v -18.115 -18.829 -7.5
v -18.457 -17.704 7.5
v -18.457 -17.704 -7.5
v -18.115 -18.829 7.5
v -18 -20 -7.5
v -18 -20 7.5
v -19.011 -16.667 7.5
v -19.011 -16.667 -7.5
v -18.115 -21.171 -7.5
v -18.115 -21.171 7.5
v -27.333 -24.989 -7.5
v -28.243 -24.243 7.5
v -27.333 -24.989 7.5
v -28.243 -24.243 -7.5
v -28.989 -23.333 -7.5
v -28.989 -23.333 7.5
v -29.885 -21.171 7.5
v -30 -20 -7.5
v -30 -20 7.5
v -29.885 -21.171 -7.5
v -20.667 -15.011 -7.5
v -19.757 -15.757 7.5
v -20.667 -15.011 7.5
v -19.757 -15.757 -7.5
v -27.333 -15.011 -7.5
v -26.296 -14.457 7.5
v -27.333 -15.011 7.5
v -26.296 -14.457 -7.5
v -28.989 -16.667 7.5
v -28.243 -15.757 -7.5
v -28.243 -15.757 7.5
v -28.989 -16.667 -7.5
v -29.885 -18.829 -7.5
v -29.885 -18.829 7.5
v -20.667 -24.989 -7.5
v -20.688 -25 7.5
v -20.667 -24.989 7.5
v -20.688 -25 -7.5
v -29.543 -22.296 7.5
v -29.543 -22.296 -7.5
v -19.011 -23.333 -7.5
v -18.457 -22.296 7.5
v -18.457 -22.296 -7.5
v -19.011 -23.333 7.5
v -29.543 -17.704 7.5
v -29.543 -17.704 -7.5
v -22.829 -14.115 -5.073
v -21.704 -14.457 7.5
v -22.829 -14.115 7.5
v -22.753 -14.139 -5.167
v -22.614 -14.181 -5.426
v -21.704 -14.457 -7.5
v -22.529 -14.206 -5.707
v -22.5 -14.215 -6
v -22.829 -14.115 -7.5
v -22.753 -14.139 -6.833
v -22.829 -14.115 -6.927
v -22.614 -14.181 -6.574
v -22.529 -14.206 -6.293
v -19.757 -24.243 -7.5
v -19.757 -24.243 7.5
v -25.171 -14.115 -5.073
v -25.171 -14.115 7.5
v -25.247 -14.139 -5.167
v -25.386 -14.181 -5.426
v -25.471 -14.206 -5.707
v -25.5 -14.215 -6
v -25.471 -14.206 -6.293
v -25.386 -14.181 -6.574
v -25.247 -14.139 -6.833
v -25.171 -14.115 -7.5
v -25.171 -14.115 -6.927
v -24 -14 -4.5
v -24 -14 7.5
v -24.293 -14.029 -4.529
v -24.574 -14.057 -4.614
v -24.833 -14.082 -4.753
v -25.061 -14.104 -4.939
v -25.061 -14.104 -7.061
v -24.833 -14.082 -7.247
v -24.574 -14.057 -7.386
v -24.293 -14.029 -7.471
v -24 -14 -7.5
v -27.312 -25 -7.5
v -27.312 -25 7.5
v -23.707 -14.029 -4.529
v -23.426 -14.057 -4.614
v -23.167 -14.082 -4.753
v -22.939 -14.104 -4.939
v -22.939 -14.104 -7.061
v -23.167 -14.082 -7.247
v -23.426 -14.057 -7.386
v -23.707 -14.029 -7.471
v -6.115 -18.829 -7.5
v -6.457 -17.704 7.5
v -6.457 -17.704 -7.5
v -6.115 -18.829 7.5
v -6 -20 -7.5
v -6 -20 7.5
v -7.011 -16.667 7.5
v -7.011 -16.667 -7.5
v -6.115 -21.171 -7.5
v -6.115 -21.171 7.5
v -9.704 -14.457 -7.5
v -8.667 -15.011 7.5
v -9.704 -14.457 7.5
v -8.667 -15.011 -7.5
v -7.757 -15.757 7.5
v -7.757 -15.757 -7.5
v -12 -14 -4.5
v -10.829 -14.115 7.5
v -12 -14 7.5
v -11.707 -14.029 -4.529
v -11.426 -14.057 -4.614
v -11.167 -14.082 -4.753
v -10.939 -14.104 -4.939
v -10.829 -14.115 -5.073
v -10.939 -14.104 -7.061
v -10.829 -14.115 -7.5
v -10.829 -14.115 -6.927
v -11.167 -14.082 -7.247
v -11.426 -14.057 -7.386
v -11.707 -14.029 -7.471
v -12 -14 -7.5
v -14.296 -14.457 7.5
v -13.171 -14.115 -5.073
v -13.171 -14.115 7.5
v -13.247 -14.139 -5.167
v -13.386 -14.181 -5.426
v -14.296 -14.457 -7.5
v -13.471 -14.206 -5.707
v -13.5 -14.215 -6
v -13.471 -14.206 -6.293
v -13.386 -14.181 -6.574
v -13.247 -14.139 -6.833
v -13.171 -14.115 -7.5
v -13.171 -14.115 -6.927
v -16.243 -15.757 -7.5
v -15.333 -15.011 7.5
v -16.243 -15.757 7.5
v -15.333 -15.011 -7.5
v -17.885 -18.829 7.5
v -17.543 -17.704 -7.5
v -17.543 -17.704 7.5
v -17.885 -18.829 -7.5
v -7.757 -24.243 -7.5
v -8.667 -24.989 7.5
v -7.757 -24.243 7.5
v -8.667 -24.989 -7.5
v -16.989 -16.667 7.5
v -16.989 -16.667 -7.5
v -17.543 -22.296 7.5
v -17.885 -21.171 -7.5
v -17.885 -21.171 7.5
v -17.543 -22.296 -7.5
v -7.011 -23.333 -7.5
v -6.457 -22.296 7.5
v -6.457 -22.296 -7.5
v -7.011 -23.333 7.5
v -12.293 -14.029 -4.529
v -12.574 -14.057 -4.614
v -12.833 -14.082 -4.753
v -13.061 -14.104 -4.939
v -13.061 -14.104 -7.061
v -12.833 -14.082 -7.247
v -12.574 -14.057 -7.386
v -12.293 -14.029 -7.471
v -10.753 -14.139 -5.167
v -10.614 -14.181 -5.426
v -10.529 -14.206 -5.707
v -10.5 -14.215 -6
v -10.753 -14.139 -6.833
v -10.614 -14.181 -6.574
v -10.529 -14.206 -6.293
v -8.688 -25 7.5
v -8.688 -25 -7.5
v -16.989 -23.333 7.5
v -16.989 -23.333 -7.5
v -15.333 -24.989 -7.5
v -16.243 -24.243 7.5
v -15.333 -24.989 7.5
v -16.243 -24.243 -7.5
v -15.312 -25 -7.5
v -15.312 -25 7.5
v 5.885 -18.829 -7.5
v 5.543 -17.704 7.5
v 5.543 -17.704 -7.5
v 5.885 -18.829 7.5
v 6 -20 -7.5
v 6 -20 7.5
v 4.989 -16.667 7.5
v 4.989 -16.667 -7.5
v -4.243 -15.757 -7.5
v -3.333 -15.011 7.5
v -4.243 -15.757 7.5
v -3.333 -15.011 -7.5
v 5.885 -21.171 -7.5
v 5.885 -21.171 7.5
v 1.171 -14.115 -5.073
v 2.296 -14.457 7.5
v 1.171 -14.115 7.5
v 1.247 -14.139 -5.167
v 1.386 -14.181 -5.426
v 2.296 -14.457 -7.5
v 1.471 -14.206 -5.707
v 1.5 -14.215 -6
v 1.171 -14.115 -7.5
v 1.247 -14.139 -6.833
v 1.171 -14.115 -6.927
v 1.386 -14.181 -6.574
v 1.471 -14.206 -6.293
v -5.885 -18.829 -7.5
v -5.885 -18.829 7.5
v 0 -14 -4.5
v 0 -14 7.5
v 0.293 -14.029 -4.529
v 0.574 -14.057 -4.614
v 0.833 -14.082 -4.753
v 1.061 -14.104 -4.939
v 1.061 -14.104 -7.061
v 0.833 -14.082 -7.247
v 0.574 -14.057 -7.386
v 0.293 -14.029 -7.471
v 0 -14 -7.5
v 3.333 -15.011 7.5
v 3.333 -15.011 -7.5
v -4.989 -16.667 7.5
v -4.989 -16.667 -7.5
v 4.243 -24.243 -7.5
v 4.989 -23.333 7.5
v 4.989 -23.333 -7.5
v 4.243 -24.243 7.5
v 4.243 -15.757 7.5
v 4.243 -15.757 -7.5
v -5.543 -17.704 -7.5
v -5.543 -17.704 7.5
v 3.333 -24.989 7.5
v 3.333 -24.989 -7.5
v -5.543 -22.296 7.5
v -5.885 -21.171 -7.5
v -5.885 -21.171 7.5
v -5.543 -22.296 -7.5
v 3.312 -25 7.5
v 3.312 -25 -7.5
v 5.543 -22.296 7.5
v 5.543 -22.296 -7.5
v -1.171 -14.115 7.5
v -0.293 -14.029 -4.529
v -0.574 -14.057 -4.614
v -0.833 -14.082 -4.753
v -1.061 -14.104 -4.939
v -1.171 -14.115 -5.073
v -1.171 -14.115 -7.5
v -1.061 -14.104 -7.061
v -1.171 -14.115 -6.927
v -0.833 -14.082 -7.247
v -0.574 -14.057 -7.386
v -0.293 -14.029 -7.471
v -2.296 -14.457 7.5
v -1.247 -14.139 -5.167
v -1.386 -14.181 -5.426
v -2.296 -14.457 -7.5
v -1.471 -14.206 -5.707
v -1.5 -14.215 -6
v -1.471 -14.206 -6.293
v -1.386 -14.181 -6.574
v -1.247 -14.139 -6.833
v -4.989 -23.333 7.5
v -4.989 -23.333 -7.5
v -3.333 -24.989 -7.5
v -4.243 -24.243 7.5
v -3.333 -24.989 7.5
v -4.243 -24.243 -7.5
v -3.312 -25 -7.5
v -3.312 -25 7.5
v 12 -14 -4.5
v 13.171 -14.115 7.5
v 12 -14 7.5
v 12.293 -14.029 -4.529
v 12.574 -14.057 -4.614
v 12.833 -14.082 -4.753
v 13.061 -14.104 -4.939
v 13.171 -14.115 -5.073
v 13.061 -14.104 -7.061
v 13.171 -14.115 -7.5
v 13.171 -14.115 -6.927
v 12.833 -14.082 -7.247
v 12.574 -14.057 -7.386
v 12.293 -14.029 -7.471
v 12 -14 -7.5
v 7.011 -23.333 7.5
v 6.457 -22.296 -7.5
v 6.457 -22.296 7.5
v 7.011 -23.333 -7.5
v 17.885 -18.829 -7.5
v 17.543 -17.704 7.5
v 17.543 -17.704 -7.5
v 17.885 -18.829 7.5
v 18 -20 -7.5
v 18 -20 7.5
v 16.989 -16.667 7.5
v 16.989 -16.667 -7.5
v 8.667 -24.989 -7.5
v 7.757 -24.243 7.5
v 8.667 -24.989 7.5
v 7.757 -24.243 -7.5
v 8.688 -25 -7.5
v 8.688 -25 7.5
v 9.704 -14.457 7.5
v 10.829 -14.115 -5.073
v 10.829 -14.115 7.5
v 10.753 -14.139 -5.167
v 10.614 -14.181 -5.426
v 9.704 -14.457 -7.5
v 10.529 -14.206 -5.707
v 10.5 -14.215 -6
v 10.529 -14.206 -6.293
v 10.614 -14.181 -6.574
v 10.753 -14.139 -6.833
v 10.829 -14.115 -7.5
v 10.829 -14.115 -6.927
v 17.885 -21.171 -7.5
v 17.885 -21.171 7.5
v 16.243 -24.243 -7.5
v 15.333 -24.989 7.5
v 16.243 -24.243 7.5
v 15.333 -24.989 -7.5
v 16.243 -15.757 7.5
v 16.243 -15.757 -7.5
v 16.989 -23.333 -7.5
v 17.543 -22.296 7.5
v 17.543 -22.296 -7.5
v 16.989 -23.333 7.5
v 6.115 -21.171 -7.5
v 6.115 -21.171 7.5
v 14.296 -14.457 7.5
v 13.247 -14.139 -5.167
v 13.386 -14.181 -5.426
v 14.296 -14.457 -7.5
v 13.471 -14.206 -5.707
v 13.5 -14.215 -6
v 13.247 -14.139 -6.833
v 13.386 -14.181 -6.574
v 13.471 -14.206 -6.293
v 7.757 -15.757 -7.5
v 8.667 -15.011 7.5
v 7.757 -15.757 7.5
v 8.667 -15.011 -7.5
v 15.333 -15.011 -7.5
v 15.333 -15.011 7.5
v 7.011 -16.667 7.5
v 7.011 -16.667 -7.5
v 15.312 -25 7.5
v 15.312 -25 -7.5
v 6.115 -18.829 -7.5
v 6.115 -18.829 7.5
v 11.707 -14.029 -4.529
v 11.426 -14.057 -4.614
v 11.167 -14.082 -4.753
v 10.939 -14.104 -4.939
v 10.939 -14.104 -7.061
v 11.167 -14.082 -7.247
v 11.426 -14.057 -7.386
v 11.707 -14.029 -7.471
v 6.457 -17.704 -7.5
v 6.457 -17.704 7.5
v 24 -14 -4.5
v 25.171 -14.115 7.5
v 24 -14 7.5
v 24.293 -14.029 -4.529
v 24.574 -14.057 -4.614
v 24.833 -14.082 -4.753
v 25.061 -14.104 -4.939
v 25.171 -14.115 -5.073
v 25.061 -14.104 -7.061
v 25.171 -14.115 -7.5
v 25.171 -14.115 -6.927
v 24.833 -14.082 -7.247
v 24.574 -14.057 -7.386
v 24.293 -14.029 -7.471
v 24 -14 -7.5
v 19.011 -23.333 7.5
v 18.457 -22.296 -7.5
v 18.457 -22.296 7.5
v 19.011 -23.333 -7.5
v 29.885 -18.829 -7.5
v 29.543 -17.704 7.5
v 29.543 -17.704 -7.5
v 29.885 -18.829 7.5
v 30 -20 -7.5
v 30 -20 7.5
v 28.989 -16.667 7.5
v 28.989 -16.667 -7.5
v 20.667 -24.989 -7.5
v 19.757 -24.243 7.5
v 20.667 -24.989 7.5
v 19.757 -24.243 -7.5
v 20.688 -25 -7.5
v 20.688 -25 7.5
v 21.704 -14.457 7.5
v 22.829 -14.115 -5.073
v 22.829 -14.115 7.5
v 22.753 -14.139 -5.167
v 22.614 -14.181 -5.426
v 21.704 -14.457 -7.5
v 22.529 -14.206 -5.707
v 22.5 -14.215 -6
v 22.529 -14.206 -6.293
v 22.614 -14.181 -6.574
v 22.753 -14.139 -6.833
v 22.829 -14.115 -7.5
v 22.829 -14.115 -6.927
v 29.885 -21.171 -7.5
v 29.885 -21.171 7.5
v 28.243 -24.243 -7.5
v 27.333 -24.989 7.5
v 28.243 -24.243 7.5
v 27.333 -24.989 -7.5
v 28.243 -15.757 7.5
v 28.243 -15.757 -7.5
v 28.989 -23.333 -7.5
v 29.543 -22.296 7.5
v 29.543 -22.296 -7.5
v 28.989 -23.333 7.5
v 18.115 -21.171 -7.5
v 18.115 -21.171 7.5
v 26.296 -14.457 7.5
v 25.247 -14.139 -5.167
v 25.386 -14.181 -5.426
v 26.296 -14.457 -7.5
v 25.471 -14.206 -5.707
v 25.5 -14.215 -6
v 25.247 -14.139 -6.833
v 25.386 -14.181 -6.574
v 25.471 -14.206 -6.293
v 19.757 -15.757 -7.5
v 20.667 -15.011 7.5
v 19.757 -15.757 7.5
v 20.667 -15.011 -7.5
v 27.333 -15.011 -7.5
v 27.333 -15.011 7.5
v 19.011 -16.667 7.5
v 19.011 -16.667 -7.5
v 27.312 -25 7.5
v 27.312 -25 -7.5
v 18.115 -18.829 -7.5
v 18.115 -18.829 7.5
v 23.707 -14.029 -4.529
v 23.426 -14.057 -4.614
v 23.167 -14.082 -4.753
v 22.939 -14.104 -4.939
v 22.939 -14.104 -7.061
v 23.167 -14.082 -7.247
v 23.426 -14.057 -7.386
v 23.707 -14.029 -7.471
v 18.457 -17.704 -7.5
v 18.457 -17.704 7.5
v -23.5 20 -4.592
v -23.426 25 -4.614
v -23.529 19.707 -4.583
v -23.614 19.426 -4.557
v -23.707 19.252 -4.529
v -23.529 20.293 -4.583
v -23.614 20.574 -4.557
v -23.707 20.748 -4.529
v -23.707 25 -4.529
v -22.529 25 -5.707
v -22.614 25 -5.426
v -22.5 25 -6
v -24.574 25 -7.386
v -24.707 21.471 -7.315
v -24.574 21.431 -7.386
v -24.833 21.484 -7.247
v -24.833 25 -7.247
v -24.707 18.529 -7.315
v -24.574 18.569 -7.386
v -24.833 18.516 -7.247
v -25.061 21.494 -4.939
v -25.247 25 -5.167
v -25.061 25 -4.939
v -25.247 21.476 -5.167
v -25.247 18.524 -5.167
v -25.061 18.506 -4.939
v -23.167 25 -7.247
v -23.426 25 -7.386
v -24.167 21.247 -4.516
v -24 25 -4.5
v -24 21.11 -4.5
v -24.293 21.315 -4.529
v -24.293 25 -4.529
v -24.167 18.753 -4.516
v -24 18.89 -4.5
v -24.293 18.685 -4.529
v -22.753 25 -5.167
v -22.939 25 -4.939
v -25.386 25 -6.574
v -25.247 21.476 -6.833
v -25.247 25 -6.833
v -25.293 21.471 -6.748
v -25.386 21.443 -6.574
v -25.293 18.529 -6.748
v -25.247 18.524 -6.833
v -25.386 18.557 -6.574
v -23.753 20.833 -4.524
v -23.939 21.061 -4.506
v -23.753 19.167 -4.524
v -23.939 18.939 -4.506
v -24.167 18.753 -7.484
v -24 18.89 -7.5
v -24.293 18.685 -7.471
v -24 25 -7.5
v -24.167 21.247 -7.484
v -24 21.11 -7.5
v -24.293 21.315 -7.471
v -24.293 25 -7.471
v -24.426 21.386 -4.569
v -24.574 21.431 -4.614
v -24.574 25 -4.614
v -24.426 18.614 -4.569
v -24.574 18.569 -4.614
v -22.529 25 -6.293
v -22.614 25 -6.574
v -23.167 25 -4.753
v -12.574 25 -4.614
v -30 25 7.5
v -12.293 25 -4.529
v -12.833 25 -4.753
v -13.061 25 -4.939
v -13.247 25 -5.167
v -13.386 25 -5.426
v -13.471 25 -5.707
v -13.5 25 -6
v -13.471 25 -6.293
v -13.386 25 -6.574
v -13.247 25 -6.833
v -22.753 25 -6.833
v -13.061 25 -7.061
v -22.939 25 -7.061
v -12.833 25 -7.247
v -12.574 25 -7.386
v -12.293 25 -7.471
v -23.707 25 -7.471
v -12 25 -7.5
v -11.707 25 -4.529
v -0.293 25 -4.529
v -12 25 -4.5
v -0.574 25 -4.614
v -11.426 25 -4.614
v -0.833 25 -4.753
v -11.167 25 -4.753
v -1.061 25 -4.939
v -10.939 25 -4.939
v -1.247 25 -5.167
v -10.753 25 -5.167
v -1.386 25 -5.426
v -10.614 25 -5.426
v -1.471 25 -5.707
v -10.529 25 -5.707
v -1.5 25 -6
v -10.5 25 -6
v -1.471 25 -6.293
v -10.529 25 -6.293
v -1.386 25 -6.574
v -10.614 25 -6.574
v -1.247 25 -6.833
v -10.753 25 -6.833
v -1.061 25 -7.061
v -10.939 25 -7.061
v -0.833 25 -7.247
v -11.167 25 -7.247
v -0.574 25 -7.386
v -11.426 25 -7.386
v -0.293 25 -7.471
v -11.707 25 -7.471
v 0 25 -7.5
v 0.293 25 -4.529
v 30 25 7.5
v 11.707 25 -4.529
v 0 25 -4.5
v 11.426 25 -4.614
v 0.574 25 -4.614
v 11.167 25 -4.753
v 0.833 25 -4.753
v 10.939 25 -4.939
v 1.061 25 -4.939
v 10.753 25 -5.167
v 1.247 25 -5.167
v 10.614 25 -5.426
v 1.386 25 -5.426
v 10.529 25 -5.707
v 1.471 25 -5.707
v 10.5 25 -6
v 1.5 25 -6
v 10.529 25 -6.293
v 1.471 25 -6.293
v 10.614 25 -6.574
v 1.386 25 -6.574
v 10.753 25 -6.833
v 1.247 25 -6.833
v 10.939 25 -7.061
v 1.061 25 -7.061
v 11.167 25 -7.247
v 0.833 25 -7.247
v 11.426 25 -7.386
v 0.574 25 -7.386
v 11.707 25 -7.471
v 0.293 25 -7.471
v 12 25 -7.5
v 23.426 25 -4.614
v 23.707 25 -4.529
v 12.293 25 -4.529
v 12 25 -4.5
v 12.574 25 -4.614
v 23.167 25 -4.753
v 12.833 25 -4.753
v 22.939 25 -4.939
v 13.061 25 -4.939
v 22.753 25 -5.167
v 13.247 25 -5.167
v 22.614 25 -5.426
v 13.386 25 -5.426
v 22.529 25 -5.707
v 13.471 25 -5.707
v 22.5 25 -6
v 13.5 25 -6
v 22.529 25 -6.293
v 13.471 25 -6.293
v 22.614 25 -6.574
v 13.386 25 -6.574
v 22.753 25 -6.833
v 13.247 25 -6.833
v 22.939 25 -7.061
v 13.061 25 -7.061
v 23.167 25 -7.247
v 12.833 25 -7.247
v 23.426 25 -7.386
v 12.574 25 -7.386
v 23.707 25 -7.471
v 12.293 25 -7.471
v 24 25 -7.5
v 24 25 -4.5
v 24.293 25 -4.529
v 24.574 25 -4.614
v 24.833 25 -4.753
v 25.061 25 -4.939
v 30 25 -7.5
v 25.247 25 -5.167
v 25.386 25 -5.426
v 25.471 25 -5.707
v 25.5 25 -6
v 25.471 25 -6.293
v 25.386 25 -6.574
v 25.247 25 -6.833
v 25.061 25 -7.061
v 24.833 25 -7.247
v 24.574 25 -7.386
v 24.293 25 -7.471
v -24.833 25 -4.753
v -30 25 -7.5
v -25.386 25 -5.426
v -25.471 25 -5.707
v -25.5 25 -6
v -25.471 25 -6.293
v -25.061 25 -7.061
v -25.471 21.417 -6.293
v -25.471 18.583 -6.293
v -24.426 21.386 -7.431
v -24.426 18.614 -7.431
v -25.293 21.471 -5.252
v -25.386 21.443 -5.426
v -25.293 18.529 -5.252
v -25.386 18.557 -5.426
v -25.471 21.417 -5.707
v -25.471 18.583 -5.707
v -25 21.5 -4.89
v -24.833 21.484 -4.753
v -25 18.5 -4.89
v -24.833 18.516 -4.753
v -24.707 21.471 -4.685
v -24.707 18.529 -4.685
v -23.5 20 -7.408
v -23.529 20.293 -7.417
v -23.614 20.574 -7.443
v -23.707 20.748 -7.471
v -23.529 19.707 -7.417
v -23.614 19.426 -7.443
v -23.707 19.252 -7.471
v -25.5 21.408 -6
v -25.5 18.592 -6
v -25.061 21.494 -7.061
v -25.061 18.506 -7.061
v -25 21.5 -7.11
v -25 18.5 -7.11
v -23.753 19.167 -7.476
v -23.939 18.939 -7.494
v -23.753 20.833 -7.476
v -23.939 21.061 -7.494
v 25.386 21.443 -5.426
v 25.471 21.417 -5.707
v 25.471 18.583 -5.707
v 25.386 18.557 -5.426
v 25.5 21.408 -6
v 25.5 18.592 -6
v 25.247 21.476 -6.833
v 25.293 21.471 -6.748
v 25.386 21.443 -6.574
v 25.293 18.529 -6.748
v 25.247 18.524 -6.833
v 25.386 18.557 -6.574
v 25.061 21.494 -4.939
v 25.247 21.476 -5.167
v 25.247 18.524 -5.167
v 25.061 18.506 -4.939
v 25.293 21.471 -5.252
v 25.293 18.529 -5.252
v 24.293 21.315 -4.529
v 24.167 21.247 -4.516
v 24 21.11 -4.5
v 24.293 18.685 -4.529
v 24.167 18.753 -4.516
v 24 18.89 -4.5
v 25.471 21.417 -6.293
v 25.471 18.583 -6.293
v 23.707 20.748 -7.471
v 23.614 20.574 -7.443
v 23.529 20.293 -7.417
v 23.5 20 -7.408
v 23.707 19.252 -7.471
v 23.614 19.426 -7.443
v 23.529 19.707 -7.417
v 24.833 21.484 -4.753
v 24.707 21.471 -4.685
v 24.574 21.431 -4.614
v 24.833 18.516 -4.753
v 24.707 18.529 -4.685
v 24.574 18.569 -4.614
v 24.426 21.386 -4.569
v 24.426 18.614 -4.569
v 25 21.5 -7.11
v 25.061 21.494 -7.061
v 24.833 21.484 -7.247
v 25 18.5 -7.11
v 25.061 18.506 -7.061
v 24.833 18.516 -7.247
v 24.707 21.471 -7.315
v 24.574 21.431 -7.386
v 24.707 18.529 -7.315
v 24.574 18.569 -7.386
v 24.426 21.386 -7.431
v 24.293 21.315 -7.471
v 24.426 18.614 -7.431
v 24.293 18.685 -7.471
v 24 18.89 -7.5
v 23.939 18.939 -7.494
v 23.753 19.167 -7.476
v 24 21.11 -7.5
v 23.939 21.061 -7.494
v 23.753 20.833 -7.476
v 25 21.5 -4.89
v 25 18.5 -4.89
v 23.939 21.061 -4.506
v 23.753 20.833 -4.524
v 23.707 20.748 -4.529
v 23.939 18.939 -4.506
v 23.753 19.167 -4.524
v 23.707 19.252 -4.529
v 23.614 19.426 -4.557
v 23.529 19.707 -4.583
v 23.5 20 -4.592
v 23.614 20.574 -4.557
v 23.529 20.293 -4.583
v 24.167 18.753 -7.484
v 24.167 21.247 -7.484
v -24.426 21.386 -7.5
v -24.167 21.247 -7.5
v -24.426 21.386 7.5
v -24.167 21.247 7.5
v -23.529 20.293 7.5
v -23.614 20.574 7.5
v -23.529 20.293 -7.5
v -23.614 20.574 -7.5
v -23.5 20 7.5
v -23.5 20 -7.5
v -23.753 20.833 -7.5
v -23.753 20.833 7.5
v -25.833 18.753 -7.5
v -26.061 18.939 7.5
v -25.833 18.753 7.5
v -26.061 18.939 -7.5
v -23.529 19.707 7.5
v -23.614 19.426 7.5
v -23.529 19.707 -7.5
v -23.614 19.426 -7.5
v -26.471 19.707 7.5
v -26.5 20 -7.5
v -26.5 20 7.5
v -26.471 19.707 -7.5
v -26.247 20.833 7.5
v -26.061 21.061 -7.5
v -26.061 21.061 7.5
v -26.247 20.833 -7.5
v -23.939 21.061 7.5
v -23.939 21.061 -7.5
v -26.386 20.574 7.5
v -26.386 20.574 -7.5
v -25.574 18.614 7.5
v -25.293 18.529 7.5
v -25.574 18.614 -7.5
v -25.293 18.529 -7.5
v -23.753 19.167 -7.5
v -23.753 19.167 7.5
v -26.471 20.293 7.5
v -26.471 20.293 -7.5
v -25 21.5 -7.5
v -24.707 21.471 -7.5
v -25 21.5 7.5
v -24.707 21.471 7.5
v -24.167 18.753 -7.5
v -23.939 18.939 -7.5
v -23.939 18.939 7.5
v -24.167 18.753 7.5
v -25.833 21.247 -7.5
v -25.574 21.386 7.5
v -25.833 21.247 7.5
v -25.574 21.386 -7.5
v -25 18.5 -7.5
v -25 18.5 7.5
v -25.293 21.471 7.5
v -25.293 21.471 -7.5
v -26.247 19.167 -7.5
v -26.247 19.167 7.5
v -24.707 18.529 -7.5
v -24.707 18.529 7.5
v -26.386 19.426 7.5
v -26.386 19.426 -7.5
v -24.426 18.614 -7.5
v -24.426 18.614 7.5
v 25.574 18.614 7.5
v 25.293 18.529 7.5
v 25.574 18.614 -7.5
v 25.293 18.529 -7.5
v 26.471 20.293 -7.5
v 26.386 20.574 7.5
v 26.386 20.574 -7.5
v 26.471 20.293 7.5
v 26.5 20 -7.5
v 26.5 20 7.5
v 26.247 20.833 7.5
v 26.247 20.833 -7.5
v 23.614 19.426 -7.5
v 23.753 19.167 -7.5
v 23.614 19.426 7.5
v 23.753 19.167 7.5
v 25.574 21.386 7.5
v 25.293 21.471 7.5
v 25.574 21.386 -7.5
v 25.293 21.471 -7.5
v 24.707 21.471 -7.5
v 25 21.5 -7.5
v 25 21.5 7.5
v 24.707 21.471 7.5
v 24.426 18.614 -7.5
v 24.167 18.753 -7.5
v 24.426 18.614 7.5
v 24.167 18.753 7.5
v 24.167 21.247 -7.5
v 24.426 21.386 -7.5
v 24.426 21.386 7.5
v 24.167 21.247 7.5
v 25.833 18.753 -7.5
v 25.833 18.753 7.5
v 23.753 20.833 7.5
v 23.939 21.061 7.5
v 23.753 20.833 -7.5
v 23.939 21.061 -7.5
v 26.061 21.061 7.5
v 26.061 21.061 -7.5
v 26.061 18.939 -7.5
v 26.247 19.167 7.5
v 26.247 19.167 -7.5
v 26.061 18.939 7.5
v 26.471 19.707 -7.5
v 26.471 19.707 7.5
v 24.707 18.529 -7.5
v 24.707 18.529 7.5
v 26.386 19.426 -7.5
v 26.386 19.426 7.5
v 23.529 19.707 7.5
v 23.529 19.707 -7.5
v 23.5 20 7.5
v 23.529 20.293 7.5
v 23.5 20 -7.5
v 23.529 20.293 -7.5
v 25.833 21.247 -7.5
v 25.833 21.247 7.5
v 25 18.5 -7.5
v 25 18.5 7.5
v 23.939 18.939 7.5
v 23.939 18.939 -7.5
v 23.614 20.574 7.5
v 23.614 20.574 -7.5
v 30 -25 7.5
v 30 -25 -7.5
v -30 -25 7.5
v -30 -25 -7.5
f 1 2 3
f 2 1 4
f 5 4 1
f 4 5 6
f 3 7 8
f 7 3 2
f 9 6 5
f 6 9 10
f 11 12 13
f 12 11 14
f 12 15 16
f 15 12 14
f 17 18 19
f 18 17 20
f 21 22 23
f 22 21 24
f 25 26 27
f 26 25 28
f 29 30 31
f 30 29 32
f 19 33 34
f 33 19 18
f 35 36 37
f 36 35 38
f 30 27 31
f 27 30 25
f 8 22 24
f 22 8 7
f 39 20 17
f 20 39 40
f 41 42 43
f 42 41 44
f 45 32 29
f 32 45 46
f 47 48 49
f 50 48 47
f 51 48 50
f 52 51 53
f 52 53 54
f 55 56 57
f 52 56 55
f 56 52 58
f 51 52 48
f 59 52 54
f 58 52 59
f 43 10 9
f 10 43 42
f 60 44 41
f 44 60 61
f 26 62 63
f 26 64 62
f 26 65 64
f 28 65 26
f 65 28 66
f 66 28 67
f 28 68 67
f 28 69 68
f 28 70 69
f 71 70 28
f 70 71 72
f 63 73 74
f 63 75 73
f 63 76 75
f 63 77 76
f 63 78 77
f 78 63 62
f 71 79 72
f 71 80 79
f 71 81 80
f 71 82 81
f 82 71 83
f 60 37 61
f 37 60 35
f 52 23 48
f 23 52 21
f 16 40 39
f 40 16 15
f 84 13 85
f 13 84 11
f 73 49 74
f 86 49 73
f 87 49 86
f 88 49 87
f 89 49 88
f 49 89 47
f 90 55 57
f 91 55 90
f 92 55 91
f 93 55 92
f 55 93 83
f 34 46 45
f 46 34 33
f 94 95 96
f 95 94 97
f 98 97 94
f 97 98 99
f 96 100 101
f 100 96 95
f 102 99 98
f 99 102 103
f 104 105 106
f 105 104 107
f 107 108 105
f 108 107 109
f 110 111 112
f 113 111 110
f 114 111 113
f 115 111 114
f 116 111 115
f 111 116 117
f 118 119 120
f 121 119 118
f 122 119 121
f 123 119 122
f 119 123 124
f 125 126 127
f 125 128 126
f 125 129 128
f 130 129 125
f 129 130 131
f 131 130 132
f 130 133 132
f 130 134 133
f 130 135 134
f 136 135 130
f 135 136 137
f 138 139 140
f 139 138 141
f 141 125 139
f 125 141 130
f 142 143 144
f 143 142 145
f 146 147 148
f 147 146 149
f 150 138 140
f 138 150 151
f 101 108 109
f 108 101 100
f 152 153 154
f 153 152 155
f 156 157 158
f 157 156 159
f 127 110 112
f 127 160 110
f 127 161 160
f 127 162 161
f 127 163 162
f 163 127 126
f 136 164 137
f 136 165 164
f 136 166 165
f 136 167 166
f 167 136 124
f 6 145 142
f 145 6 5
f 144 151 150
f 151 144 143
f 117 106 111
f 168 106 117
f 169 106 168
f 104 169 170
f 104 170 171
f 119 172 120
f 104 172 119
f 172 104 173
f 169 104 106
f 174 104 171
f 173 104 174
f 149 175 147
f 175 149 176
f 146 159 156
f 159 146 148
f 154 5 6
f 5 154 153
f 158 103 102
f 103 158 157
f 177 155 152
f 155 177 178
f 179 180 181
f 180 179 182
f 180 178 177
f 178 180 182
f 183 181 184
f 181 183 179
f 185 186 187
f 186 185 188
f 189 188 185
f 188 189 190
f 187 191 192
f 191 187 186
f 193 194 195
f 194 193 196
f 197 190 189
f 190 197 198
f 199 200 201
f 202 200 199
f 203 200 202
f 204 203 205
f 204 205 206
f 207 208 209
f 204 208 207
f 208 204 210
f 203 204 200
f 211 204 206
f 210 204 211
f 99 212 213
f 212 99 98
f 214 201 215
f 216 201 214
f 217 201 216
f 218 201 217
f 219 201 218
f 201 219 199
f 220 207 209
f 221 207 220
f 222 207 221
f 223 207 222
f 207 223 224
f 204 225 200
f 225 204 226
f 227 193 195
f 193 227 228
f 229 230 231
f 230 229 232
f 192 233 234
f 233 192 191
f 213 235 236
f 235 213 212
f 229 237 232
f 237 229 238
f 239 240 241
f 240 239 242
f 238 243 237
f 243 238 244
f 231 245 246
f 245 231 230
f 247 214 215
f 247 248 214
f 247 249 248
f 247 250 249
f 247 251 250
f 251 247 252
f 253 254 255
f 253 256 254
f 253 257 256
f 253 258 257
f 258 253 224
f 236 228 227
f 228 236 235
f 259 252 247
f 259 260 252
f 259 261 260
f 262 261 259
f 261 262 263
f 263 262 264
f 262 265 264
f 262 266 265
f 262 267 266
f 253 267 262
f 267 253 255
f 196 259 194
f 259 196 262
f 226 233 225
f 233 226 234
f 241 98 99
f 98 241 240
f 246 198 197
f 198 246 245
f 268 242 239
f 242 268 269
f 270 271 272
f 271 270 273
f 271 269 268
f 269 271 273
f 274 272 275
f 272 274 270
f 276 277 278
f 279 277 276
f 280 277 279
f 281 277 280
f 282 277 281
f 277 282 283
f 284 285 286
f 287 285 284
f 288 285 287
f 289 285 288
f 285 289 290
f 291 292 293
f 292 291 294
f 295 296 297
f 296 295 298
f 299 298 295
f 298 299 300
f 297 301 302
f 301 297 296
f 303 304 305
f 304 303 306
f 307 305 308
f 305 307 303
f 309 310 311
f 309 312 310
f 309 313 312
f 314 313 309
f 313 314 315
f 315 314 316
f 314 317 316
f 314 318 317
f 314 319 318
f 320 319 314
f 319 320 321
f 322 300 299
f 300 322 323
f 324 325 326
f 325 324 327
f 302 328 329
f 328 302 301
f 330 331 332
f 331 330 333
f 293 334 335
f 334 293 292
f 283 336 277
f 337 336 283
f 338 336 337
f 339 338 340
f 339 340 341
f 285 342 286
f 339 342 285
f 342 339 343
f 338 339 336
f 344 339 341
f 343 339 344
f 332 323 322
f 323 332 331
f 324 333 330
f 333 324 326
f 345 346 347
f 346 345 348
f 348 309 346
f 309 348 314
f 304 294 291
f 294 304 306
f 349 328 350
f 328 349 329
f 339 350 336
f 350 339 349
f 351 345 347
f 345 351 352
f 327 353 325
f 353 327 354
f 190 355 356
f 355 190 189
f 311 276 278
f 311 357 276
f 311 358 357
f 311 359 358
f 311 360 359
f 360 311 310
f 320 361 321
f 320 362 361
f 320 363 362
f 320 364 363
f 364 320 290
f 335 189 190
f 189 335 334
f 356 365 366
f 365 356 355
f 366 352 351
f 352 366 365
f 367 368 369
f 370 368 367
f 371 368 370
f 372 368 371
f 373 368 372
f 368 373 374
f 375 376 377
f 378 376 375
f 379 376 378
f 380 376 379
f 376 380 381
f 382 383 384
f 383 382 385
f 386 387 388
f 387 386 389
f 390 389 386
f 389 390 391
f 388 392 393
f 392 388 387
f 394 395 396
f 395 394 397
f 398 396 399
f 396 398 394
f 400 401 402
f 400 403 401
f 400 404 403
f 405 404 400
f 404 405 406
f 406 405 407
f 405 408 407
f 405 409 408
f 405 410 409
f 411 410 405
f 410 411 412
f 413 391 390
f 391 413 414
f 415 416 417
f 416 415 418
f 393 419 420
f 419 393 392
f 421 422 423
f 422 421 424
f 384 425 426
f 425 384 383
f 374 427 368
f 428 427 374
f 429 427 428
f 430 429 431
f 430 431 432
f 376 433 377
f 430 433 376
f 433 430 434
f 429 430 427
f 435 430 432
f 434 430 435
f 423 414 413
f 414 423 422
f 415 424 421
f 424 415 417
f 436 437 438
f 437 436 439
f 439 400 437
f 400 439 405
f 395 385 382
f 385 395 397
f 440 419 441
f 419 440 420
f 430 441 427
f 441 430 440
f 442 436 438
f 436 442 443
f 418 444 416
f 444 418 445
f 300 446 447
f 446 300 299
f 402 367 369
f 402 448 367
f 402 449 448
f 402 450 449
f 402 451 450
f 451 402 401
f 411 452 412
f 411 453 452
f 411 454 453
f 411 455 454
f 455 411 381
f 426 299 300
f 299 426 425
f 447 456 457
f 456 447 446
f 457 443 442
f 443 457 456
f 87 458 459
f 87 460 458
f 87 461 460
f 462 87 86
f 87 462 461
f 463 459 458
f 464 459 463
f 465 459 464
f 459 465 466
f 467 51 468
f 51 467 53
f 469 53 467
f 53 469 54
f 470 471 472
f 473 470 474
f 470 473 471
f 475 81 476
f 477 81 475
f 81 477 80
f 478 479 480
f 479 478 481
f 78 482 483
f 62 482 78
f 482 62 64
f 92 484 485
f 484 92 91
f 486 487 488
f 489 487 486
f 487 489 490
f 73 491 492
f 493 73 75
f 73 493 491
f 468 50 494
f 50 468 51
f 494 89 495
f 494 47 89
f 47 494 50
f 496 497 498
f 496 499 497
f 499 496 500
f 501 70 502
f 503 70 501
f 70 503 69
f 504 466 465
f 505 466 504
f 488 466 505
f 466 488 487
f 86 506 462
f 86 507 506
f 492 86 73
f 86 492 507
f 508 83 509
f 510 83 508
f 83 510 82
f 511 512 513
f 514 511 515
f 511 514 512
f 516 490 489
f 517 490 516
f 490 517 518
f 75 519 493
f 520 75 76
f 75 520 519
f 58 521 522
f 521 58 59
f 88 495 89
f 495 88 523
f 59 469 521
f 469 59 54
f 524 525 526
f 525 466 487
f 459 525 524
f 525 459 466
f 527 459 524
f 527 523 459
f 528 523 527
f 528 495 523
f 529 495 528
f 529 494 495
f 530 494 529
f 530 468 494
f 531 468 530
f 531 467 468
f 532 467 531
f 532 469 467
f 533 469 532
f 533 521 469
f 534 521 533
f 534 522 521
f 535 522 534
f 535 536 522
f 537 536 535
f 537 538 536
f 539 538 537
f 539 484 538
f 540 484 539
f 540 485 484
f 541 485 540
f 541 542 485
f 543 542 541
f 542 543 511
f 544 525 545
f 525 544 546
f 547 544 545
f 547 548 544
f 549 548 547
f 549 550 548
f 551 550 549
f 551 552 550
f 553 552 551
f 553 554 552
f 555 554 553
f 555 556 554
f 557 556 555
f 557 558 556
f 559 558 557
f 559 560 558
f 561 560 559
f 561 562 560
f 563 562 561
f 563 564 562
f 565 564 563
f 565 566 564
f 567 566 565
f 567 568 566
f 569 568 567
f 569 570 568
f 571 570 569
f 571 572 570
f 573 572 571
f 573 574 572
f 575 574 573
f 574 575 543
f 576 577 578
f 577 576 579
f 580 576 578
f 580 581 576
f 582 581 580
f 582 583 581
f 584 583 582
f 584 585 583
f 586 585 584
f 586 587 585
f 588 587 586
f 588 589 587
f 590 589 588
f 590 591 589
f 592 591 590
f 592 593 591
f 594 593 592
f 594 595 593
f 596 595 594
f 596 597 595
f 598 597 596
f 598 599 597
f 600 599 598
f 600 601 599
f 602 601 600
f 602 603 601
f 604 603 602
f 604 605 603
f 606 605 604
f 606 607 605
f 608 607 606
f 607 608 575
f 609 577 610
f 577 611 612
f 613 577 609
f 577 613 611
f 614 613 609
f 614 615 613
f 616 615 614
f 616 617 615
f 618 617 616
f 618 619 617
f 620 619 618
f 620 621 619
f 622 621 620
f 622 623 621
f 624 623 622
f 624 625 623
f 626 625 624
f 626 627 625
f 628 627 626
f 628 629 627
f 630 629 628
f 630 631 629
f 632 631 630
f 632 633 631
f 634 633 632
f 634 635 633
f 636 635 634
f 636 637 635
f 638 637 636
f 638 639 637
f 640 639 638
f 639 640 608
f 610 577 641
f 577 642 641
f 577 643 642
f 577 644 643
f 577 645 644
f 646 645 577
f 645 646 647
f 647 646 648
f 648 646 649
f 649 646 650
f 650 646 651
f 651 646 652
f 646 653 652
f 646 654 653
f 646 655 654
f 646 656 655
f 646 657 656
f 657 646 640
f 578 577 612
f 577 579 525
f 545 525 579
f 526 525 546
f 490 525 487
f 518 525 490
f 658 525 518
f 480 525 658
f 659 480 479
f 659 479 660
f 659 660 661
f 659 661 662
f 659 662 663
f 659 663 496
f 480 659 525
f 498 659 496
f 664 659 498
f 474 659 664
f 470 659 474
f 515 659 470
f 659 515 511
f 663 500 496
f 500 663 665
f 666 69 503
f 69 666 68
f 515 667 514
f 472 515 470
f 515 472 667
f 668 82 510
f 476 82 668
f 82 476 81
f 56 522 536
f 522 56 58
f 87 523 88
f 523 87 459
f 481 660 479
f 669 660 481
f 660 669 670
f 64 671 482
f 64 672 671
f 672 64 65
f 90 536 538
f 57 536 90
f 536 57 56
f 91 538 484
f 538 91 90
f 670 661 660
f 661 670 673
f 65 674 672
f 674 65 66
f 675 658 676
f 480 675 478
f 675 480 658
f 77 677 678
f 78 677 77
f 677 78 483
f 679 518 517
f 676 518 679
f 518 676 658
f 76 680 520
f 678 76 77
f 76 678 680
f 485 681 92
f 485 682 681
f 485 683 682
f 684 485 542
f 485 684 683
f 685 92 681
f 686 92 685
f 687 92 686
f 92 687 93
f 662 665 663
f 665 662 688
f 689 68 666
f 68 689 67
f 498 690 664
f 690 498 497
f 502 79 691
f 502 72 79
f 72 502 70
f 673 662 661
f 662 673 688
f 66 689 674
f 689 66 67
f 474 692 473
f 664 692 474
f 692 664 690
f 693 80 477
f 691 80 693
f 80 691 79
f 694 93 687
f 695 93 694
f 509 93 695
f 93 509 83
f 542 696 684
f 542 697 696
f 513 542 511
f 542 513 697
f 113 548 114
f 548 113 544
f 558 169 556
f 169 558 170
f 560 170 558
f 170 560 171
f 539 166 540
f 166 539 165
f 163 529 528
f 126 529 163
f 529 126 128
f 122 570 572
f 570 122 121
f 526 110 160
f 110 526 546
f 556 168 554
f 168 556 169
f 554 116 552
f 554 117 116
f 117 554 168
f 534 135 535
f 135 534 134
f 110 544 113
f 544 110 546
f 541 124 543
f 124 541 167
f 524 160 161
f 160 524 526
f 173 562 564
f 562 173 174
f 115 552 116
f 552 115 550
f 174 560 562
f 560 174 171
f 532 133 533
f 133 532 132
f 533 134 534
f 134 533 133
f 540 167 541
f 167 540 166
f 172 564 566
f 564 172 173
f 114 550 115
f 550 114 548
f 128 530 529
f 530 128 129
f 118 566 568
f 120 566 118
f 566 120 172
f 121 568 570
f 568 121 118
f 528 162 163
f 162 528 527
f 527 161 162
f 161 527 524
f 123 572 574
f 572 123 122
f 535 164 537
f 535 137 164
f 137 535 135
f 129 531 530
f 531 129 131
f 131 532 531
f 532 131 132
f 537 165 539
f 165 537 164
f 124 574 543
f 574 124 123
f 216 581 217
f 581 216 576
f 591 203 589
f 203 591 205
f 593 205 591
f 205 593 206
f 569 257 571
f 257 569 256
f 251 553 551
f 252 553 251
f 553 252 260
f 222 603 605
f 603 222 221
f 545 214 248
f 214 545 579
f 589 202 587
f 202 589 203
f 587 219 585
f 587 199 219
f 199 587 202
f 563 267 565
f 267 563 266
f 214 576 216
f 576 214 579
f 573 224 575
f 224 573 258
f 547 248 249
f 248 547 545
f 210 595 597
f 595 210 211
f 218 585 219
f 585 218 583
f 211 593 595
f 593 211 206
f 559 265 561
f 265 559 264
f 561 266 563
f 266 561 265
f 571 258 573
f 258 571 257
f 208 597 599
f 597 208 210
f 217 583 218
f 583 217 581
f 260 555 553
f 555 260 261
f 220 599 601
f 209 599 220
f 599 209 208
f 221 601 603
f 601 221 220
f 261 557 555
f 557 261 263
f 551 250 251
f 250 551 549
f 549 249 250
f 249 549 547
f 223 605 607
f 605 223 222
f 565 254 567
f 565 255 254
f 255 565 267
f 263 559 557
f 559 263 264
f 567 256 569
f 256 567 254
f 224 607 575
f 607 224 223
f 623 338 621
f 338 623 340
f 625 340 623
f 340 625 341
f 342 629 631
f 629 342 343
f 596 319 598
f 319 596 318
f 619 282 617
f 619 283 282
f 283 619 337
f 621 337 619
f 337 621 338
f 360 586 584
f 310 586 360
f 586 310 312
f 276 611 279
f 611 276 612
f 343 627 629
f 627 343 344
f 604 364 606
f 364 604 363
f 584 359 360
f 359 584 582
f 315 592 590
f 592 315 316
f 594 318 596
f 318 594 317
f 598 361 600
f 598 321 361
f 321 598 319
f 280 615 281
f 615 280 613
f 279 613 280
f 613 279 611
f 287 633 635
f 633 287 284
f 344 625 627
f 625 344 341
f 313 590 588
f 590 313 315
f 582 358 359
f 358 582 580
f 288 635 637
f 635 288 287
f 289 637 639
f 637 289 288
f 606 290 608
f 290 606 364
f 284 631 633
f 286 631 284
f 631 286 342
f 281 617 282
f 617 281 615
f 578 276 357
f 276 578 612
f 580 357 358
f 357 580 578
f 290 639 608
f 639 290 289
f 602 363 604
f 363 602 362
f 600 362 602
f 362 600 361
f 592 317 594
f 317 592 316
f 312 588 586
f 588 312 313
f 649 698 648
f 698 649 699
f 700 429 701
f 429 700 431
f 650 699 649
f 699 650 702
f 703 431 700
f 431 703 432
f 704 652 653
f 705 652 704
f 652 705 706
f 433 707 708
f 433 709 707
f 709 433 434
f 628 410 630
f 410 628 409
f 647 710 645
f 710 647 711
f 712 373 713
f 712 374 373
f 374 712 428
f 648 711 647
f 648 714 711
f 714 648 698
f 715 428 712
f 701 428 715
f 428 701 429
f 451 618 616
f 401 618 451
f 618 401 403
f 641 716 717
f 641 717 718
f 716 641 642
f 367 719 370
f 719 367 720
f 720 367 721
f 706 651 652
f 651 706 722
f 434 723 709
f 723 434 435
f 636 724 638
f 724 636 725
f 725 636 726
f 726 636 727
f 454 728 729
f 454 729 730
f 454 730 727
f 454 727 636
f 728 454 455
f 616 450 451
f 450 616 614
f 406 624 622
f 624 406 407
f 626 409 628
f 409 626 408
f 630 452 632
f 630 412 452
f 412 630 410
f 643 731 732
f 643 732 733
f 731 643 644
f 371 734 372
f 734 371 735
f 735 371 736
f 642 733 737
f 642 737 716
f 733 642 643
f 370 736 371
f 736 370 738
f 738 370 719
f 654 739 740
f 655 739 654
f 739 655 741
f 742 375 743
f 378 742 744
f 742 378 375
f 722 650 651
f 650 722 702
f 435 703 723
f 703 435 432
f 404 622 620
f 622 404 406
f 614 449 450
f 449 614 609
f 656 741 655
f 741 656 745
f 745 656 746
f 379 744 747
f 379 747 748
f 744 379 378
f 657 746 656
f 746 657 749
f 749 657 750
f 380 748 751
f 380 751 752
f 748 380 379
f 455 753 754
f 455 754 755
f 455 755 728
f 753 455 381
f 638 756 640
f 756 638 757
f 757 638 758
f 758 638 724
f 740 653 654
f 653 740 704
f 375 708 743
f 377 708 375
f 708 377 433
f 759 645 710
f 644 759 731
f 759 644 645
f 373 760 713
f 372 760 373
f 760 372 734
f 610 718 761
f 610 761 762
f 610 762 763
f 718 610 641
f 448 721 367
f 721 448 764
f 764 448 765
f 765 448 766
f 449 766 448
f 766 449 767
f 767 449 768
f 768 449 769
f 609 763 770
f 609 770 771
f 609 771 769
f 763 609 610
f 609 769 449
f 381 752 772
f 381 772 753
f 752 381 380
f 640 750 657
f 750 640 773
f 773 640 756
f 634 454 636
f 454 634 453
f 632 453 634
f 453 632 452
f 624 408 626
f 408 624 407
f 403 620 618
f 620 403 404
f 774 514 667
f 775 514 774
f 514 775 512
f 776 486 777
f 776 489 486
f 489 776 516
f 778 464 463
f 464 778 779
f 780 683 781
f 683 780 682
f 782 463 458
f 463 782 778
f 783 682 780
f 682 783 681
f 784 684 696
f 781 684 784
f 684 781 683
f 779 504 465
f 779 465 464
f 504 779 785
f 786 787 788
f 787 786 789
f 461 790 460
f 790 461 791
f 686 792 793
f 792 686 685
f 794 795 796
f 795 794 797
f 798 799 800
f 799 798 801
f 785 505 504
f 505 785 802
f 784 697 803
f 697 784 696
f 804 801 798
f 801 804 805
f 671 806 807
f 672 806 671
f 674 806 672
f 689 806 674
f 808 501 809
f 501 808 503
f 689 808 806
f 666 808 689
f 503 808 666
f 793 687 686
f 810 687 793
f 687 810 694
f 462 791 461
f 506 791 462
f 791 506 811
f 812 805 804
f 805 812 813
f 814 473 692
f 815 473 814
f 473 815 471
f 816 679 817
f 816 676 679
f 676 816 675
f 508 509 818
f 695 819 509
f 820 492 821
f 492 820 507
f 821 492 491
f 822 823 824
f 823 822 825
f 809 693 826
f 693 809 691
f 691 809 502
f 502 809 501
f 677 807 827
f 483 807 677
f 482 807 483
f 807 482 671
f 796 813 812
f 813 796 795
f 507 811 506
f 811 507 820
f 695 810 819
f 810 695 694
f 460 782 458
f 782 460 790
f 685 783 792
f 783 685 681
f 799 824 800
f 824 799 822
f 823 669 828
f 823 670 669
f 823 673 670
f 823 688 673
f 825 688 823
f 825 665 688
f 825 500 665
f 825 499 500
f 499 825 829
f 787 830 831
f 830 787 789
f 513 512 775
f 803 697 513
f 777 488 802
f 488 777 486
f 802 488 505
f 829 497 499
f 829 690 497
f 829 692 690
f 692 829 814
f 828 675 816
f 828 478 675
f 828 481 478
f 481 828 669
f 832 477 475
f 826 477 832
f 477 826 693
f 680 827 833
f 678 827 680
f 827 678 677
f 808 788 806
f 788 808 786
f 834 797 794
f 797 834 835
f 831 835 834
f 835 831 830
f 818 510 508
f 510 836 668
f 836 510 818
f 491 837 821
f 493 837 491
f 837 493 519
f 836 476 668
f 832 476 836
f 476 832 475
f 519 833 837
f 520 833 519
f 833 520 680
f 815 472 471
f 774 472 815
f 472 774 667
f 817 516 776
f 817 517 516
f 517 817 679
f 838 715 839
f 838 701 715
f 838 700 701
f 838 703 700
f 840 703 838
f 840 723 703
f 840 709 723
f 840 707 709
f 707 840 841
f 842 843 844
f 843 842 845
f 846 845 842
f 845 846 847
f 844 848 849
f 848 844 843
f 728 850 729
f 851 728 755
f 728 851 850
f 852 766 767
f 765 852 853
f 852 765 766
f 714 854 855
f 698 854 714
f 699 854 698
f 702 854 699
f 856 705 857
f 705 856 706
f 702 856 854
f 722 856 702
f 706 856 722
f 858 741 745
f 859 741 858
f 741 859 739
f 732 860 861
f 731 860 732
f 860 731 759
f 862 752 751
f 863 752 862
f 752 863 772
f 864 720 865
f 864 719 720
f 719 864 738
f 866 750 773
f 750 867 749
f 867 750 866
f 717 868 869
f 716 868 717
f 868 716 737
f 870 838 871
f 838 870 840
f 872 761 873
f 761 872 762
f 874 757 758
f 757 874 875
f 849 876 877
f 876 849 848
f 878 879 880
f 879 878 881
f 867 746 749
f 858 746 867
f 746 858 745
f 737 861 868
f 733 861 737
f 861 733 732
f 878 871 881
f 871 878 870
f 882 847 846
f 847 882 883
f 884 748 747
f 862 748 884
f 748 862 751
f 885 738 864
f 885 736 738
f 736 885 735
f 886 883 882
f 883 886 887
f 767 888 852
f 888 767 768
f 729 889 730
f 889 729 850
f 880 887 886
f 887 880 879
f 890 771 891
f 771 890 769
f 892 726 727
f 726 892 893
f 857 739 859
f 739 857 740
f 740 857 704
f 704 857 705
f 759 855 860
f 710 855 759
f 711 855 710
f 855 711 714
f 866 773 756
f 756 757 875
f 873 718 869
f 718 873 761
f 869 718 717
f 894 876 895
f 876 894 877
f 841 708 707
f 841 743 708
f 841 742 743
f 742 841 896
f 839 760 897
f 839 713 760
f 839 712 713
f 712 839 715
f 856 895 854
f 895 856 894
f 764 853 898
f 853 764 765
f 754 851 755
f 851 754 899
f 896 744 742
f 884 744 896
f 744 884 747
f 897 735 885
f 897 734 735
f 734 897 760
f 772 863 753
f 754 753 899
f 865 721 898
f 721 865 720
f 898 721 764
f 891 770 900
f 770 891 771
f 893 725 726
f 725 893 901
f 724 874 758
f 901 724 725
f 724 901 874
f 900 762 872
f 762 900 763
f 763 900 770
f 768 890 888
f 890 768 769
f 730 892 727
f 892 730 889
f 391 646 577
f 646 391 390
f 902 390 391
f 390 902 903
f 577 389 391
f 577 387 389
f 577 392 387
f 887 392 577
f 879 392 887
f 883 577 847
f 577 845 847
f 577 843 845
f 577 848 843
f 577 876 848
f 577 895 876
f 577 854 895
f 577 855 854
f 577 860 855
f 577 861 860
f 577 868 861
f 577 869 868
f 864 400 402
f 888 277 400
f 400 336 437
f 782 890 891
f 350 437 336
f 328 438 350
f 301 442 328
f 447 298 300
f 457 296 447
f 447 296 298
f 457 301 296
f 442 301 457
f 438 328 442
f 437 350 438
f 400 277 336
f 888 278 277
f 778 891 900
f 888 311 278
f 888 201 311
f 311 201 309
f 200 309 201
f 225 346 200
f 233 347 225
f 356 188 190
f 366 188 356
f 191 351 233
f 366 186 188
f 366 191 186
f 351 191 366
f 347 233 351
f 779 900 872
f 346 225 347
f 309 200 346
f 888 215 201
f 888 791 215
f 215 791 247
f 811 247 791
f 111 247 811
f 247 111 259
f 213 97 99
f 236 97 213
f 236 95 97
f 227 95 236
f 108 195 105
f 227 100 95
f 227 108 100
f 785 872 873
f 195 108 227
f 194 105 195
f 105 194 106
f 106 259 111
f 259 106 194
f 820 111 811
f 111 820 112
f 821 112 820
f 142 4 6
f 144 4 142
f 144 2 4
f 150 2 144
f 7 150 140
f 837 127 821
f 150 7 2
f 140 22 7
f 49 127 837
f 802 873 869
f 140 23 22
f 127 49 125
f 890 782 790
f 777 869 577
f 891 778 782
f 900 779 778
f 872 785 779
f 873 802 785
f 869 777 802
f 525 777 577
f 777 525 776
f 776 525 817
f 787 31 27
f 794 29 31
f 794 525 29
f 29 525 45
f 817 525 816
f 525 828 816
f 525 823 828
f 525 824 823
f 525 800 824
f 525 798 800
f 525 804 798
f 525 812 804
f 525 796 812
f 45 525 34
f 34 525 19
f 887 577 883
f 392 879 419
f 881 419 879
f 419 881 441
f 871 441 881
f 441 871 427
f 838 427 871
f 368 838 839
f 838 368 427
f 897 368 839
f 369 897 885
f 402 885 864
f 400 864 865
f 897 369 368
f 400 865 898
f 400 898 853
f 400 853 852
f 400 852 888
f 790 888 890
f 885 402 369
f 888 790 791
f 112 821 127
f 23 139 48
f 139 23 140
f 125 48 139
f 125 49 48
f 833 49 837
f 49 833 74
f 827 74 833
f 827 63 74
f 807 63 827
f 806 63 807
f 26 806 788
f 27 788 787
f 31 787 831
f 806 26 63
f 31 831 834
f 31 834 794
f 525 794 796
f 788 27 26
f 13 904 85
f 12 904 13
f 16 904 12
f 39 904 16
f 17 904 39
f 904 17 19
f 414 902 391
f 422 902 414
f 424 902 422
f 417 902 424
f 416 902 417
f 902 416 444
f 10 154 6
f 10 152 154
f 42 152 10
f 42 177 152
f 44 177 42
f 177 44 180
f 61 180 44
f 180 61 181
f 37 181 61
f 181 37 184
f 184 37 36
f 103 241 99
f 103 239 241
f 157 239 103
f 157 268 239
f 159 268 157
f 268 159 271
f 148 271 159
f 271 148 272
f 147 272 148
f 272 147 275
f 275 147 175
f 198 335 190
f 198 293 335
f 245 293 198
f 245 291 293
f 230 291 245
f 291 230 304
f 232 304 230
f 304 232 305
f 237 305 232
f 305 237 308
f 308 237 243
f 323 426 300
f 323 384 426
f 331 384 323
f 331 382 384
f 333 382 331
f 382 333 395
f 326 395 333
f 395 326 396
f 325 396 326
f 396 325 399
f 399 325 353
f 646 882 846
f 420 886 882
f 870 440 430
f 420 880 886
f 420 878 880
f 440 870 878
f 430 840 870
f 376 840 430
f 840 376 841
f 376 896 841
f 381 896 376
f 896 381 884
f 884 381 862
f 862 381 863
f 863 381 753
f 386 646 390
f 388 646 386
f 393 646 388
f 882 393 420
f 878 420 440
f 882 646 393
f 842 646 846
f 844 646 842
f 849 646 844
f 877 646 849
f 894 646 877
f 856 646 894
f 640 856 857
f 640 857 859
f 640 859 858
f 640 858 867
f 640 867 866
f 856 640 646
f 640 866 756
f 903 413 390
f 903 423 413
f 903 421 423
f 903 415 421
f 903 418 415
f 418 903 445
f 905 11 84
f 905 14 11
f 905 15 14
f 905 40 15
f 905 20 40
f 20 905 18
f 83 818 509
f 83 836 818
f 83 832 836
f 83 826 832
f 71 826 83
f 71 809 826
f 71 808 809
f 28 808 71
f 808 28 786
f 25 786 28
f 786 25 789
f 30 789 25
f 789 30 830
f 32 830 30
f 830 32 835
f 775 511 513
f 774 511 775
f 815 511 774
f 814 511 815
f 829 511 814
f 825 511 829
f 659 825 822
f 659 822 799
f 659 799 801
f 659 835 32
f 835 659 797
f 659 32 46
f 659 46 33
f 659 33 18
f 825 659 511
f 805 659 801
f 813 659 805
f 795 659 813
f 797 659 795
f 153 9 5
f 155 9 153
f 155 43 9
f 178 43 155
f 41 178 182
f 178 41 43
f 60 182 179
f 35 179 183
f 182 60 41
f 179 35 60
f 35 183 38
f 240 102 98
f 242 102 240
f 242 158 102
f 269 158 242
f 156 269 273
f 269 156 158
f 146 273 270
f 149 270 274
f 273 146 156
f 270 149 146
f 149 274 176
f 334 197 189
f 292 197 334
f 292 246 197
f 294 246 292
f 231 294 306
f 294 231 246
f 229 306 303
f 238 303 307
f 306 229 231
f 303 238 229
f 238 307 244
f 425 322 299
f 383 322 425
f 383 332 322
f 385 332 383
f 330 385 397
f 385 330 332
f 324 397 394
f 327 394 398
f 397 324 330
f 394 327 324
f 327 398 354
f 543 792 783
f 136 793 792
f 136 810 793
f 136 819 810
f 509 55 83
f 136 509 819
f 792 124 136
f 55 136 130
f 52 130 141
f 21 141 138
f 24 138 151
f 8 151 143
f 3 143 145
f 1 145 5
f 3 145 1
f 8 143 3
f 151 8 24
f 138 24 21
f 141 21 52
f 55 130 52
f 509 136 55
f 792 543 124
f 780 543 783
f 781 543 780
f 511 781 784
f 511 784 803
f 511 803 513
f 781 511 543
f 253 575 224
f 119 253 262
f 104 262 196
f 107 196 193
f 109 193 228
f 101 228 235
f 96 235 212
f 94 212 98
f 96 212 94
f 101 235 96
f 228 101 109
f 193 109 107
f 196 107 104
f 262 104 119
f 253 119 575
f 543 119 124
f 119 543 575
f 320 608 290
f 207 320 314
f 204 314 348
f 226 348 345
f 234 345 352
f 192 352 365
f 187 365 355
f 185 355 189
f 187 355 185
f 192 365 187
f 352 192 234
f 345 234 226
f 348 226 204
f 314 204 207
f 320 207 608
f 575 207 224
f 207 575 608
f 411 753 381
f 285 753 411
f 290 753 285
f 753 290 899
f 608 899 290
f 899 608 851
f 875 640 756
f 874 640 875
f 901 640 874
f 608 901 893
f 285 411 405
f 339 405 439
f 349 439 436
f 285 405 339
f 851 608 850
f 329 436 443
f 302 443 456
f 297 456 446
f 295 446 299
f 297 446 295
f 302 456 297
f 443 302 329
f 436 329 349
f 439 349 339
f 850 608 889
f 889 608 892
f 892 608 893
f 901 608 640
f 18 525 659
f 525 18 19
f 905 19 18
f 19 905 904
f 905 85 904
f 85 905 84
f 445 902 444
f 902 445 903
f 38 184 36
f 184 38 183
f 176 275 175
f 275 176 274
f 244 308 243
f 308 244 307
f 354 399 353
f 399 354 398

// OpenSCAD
// COBRA Hand Palm - LEFT

$fn = 32;

module palm() {
    difference() {
        cube([60, 50, 15], center=true);
        
        // Motor cavities
        for(i = [0:4]) {
            translate([(i - 2) * 12, -20, 0])
            cylinder(h=17, d=12, center=true);
        }
        
        // Tendon channels
        for(i = [0:4]) {
            translate([(i - 2) * 12, 0, -6])
            rotate([90, 0, 0])
            cylinder(h=50, d=3, center=true);
        }
        
        // Mounting holes
        for(x = [-25, 25]) {
            for(y = [-20, 20]) {
                translate([x, y, 0])
                cylinder(h=17, d=3, center=true);
            }
        }
    }
}

palm();
